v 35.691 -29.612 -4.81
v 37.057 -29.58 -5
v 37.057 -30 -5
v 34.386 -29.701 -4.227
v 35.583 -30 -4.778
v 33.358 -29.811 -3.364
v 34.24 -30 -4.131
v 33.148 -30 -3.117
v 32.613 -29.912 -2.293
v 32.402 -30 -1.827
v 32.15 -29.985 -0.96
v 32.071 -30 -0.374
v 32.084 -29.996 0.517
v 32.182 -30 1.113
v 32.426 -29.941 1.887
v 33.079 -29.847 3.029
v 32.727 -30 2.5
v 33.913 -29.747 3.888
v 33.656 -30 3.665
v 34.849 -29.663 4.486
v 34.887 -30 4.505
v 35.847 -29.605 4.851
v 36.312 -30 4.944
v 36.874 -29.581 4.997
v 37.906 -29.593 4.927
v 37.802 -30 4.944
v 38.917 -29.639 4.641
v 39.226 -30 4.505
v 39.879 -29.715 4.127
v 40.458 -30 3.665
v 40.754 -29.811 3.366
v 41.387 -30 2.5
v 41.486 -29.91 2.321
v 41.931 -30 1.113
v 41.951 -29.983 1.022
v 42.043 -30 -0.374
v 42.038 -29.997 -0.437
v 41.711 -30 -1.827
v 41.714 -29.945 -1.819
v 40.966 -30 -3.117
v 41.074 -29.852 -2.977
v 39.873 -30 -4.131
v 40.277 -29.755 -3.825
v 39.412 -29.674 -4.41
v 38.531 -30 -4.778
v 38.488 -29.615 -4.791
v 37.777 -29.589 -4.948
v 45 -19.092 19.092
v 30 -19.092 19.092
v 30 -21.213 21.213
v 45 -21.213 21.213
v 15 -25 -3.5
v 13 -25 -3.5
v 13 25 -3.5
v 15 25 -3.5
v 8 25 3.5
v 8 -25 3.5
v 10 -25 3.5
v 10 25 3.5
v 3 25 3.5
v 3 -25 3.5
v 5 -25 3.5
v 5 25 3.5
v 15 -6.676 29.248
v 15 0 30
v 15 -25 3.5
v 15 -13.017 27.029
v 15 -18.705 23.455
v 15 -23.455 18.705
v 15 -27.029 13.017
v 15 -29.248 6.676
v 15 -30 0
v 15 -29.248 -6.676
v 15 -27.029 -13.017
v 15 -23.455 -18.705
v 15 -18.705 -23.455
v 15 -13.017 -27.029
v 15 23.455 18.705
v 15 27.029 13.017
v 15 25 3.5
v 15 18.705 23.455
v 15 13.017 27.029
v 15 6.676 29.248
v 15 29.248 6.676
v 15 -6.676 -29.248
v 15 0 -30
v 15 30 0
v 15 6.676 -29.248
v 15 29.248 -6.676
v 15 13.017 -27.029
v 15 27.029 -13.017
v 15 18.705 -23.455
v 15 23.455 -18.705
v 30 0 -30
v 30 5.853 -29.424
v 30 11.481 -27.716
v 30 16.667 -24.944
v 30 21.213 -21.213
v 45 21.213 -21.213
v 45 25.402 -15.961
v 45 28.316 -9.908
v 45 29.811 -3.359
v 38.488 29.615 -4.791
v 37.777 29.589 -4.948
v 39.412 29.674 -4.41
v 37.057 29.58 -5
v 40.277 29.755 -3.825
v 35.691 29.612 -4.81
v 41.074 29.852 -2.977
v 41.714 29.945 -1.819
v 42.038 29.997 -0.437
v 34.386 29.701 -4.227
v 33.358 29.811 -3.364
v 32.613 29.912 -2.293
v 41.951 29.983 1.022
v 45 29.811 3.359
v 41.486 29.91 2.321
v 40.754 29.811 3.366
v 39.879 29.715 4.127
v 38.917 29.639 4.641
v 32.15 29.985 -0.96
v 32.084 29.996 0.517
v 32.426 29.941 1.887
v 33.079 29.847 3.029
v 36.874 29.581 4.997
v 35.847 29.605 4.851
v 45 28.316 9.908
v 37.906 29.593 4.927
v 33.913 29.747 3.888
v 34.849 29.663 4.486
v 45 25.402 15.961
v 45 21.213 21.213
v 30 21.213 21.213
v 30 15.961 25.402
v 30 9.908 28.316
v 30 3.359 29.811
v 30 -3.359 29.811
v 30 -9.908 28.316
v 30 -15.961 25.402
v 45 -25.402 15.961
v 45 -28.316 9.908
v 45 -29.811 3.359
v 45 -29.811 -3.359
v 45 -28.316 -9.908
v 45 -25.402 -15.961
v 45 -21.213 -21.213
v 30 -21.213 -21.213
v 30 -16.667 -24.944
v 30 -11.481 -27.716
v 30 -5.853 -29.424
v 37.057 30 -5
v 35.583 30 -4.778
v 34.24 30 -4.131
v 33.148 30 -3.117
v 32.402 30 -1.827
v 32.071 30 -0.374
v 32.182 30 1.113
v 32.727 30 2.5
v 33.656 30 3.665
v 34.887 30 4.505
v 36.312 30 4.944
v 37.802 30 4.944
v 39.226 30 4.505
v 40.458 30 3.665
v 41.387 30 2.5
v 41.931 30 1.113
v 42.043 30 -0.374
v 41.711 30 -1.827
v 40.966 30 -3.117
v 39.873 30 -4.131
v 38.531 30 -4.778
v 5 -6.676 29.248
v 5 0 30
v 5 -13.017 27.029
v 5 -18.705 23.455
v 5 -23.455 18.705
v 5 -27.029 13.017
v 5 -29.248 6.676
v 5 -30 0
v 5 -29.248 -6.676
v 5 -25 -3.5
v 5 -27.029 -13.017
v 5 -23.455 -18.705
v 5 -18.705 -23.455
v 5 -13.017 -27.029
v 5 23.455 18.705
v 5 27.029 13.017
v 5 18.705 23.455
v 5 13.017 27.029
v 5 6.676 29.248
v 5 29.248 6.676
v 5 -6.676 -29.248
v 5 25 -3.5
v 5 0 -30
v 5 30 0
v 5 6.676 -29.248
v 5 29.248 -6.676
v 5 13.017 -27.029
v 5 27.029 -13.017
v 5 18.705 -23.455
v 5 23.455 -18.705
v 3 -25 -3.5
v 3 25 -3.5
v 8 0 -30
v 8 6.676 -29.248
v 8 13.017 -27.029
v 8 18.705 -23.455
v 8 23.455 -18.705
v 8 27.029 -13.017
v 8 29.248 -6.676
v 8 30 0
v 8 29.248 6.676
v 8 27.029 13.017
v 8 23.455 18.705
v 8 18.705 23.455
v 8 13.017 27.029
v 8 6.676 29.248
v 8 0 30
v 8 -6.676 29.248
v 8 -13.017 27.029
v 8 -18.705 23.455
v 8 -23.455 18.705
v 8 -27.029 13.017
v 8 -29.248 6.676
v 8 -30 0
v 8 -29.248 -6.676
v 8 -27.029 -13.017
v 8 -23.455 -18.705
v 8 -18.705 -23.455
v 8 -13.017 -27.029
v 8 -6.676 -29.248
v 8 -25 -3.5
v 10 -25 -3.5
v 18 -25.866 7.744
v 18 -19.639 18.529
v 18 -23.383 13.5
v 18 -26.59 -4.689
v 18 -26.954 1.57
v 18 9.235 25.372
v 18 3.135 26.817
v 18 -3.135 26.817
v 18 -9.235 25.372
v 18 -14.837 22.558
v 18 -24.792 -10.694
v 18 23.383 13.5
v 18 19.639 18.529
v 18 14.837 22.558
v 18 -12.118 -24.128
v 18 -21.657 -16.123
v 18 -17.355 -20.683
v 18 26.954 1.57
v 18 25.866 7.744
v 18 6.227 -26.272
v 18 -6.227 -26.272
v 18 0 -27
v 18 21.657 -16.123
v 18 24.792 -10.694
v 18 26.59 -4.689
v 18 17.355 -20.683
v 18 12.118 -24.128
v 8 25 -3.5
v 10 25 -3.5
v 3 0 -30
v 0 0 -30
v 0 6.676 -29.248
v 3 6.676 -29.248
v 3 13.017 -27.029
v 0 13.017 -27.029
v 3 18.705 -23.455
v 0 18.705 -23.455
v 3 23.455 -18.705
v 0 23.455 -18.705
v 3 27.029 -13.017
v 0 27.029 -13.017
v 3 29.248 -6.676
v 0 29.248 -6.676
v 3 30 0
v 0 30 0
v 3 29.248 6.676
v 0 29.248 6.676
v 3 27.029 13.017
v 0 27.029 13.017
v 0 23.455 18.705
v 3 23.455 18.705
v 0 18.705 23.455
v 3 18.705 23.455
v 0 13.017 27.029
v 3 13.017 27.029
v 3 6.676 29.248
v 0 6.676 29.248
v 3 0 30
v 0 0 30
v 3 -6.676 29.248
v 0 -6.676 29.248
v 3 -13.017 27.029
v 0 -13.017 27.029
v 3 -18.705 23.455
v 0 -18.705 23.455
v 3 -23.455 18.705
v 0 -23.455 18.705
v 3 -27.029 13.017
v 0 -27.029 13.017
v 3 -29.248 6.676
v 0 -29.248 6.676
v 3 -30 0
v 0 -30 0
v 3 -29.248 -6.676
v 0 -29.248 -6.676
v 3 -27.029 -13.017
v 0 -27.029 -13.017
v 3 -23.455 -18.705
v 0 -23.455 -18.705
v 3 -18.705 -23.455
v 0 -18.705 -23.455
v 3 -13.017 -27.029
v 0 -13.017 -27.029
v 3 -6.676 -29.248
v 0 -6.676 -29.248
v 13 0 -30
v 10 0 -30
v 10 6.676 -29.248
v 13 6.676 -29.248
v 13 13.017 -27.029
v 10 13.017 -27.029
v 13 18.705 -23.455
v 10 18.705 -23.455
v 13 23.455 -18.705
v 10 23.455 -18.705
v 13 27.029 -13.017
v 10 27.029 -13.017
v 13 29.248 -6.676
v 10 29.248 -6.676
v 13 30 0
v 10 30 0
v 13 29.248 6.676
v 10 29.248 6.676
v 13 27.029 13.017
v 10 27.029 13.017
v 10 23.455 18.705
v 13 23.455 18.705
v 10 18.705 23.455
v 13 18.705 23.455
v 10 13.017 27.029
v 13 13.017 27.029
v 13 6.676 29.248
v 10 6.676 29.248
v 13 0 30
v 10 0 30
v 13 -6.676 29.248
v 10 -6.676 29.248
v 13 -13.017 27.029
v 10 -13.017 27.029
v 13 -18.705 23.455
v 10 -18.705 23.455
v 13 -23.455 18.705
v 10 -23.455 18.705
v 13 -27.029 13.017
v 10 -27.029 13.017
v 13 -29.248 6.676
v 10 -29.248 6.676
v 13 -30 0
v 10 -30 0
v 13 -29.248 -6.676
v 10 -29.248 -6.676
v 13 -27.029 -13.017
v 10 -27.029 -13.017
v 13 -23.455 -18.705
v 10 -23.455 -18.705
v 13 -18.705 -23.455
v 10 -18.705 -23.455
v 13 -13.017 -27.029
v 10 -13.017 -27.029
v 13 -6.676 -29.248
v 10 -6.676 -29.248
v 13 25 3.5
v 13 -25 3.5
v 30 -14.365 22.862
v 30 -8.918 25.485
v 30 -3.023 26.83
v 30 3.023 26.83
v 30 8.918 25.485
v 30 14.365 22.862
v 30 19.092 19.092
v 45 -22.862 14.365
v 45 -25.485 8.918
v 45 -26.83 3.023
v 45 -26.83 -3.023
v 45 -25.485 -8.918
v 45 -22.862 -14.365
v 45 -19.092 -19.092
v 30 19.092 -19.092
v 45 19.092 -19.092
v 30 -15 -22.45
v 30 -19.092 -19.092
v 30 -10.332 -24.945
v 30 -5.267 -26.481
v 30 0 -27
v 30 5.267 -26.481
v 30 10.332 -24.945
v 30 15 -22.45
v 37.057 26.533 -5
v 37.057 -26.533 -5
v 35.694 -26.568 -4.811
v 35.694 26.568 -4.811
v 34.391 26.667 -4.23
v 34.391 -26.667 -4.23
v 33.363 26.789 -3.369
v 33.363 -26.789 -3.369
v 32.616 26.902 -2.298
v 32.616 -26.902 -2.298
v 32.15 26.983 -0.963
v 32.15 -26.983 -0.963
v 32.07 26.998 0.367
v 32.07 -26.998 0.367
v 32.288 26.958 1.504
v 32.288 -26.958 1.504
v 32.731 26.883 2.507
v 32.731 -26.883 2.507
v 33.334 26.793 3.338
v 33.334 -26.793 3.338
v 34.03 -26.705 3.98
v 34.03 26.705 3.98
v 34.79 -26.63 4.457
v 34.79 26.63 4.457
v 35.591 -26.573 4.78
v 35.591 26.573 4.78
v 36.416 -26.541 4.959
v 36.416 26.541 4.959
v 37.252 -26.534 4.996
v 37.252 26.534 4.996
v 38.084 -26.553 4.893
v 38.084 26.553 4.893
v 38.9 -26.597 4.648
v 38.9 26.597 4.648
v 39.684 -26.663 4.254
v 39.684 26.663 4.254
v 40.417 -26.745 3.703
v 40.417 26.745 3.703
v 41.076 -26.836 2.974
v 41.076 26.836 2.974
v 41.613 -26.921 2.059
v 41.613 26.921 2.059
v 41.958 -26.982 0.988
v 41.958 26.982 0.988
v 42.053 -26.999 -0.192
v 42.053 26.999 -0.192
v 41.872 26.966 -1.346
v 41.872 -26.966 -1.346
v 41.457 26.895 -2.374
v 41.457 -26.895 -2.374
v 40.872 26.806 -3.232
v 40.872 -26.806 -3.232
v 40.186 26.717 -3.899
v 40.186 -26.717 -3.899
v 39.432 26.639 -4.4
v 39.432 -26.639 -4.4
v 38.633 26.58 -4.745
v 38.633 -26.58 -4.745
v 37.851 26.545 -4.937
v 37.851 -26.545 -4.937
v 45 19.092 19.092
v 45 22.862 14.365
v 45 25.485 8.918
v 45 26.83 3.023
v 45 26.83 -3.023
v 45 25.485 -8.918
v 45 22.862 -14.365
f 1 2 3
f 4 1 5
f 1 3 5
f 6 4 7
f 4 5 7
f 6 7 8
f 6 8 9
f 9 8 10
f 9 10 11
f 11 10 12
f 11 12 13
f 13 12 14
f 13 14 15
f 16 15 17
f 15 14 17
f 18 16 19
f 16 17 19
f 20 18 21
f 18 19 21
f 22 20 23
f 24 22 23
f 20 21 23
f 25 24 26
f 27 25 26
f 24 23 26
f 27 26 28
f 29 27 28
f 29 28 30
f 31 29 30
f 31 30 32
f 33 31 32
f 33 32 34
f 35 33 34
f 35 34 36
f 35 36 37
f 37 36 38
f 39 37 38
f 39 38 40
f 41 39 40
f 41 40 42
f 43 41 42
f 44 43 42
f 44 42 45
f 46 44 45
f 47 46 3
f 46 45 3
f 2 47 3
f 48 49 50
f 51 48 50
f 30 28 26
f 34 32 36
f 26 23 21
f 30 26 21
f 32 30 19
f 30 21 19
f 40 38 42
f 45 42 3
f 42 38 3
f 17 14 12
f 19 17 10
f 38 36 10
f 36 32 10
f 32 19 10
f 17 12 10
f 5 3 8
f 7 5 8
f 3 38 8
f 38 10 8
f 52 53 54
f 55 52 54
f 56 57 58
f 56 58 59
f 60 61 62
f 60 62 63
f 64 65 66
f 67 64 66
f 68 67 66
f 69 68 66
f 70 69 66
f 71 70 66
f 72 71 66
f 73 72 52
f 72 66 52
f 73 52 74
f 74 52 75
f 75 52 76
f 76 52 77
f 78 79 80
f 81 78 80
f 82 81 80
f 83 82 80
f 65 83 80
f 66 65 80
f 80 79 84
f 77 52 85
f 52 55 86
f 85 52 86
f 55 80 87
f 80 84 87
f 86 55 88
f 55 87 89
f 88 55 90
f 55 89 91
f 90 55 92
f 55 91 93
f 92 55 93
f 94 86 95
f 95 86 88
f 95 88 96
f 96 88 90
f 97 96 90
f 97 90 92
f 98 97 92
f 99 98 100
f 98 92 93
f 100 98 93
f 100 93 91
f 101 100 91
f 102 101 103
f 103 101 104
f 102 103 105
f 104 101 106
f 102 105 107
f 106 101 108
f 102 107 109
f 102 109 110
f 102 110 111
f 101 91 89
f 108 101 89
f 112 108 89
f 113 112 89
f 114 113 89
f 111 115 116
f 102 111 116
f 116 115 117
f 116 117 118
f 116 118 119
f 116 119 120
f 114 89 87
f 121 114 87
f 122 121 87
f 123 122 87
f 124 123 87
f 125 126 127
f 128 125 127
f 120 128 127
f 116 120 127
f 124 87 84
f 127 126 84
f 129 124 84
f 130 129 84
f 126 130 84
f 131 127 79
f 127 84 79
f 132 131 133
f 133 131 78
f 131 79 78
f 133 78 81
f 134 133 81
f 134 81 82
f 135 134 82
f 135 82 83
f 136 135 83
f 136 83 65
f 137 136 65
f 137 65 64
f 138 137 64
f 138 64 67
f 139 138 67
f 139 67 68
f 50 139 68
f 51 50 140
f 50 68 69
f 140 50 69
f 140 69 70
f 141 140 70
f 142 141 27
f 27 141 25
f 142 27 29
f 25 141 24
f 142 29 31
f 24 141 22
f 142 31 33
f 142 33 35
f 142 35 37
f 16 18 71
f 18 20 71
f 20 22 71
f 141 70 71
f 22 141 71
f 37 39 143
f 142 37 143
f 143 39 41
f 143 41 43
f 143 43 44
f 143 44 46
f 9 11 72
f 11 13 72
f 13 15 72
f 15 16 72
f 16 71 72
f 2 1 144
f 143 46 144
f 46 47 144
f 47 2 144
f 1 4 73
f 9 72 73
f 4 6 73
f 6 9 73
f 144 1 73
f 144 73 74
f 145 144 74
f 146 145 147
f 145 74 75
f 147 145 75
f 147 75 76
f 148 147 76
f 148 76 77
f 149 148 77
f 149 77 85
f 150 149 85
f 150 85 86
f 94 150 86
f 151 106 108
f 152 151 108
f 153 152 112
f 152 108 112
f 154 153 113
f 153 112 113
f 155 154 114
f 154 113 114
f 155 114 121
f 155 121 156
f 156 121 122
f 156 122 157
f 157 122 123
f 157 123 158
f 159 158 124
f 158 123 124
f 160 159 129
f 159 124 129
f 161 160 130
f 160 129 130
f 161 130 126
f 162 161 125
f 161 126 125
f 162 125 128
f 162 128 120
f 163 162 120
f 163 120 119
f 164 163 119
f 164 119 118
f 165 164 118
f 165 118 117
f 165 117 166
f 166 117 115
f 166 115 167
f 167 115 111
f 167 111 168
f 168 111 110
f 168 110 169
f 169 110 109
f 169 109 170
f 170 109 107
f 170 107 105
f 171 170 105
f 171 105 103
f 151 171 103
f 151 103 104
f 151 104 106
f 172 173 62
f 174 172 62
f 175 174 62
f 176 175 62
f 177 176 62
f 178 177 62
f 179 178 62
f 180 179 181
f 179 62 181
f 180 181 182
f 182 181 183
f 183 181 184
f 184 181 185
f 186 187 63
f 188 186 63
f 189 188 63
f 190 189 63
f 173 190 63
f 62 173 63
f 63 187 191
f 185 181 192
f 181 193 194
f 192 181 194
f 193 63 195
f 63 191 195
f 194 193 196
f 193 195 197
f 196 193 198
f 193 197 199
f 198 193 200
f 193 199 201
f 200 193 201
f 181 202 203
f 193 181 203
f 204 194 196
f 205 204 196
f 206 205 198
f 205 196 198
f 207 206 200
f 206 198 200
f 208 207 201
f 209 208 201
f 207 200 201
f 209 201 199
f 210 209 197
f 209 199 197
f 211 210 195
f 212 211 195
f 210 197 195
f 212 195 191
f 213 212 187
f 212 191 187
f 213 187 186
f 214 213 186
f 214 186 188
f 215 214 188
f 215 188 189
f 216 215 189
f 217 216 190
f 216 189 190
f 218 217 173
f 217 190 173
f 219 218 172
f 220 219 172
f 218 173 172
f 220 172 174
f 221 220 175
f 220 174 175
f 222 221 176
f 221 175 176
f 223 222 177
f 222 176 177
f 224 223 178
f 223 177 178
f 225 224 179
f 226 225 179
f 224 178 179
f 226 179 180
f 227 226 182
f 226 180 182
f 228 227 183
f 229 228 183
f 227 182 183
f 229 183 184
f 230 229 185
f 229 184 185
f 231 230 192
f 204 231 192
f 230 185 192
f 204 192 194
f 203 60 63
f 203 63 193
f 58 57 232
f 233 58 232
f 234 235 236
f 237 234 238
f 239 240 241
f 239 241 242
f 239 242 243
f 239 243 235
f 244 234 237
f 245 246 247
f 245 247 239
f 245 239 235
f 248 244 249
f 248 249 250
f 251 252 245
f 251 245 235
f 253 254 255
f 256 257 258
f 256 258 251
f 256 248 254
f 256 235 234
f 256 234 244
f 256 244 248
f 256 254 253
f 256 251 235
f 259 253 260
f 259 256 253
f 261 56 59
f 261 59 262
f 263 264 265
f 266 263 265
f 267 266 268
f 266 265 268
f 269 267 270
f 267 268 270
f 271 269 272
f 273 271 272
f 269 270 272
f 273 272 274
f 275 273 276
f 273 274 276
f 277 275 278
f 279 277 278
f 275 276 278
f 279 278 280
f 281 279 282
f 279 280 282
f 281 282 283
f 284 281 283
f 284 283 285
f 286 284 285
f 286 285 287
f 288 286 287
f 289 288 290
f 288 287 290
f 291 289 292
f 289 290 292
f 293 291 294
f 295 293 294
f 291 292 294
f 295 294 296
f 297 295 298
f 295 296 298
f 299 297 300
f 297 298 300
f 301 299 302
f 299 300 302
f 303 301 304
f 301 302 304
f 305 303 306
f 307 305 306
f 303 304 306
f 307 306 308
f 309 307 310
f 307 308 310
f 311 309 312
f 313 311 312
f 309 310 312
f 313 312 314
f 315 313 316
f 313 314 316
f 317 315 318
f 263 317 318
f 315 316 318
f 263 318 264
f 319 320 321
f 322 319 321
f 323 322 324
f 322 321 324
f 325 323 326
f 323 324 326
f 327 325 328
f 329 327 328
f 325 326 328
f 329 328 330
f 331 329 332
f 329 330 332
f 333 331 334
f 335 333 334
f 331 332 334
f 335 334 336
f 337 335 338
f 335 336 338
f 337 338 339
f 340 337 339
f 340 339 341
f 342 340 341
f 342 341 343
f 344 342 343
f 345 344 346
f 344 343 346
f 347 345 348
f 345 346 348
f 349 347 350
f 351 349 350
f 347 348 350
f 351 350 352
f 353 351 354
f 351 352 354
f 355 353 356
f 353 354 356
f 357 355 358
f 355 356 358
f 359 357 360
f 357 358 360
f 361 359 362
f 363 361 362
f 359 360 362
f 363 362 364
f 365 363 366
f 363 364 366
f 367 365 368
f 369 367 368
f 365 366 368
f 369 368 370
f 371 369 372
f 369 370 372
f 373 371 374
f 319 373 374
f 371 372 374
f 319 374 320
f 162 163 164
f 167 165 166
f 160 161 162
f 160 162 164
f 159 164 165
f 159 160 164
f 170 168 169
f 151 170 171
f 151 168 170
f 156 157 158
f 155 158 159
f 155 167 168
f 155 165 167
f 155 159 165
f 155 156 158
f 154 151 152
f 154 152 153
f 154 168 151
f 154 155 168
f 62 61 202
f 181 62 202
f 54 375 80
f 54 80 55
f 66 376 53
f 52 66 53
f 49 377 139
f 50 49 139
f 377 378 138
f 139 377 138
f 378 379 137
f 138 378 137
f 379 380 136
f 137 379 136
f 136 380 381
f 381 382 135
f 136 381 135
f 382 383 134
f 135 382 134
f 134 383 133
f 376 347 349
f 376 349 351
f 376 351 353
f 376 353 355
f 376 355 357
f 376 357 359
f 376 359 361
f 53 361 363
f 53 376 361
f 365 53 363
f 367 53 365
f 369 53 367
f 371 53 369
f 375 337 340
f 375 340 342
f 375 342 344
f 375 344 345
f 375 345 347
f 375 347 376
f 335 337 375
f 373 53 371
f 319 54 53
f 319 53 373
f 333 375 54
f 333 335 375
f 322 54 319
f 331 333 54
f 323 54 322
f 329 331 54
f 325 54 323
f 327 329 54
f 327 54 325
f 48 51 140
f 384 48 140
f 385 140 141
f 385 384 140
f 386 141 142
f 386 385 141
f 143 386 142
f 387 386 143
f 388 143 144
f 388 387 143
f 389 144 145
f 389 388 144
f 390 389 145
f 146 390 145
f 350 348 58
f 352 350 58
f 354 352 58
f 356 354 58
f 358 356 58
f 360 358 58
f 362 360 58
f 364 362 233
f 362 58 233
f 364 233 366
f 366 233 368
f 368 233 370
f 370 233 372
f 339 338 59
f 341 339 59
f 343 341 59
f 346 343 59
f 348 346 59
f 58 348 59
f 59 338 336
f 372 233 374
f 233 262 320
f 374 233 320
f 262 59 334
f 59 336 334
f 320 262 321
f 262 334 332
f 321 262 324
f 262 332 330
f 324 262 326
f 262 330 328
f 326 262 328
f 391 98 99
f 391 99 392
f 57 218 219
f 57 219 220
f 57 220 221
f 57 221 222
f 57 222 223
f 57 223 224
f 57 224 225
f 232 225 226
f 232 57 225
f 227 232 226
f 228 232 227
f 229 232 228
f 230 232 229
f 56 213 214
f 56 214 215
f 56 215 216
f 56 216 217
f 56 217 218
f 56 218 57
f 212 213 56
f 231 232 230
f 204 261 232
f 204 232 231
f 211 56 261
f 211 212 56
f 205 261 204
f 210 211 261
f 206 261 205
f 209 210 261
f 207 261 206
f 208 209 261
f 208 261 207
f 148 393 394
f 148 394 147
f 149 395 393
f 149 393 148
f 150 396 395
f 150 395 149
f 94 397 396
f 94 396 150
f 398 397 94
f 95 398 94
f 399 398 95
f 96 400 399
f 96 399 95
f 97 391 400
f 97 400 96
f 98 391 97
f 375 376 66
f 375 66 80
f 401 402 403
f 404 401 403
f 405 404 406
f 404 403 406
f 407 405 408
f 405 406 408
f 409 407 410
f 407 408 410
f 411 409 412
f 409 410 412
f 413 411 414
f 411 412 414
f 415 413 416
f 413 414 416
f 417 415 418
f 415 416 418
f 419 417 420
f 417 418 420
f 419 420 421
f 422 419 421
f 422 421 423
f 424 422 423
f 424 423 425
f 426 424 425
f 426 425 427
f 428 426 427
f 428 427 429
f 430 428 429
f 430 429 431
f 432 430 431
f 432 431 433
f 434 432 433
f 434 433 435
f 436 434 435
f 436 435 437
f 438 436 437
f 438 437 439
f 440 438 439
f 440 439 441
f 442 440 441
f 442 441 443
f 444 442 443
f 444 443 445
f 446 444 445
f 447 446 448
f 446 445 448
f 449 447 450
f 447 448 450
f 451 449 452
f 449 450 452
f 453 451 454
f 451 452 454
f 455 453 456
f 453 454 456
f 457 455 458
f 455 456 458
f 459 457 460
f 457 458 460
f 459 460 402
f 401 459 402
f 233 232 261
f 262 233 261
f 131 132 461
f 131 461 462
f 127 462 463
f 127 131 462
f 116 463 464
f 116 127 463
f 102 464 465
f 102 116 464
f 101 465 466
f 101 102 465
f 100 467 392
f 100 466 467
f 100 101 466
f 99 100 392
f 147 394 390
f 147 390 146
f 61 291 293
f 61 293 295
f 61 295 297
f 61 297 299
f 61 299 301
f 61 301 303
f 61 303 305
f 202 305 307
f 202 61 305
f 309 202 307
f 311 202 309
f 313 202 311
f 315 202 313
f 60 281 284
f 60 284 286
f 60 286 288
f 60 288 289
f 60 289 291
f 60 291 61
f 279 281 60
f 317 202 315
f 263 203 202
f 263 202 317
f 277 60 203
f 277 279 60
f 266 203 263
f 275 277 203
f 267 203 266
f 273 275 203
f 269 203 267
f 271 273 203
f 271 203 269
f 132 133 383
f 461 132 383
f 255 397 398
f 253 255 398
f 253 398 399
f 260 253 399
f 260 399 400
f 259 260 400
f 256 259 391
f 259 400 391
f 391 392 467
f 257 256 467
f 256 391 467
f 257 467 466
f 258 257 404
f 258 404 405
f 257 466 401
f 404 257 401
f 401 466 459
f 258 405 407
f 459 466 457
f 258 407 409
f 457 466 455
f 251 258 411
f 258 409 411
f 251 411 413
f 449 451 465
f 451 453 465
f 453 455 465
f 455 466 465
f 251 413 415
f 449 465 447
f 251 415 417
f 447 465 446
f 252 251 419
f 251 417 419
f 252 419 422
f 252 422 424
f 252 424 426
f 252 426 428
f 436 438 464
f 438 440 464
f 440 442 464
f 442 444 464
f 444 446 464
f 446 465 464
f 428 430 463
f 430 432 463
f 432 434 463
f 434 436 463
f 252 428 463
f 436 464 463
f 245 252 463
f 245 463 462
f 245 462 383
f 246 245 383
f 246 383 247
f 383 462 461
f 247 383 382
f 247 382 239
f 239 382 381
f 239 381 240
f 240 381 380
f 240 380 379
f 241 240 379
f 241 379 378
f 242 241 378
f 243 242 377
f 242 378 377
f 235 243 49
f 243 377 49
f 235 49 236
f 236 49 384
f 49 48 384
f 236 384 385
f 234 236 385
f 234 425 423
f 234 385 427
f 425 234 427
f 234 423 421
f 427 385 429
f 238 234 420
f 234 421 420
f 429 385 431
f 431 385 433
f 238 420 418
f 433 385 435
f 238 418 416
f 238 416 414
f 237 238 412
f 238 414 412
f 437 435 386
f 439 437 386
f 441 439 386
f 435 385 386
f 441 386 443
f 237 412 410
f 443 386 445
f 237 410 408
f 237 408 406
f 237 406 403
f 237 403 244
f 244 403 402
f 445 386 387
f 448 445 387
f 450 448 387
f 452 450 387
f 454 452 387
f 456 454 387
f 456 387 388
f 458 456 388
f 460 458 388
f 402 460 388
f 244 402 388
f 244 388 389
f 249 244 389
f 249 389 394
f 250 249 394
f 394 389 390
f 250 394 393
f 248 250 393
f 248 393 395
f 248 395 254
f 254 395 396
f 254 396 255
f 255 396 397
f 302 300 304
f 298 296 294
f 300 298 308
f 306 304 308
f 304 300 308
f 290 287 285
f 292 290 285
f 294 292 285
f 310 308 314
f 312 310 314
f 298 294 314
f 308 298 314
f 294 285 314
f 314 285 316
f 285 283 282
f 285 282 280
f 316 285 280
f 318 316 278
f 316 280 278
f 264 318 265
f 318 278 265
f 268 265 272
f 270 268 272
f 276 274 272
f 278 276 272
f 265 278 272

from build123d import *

# Parameters (mm, degrees)
SKETCH1_R            = 30
BOSS_EXTRUDE1_DEPTH  = 3
SKETCH2_W            = 7
SKETCH2_H            = 50
BOSS_EXTRUDE2_DEPTH  = 2
SKETCH3_R            = 30
BOSS_EXTRUDE3_DEPTH  = 3
SKETCH4_W            = 7
SKETCH4_H            = 50
BOSS_EXTRUDE4_DEPTH  = 2
SKETCH5_R            = 30
BOSS_EXTRUDE5_DEPTH  = 3
SKETCH6_W            = 7
SKETCH6_H            = 50
BOSS_EXTRUDE6_DEPTH  = 2
SKETCH7_R            = 30
BOSS_EXTRUDE7_DEPTH  = 30
SKETCH8_R            = 27
CUT_EXTRUDE3_DEPTH   = 27
CUT_EXTRUDE6_START   = -15
CUT_EXTRUDE6_DEPTH   = 15
BOSS_EXTRUDE11_START = -30.000001
SKETCH14_R           = 5
BOSS_EXTRUDE11_DEPTH = 60.000002


with BuildPart() as part:
    # Sketch1 → Boss-Extrude1 (new body)
    with BuildSketch(Plane(origin=(0, 0, 0), x_dir=(0, 0, -1), z_dir=(1, 0, 0))):
        Circle(SKETCH1_R)
    extrude(amount=BOSS_EXTRUDE1_DEPTH)

    # Sketch2 → Boss-Extrude2 (add)
    with BuildSketch(Plane(origin=(3, 0, 0), x_dir=(0, 0, -1), z_dir=(1, 0, 0))):
        Rectangle(SKETCH2_W, SKETCH2_H)
    extrude(amount=BOSS_EXTRUDE2_DEPTH)

    # Sketch3 → Boss-Extrude3 (add)
    with BuildSketch(Plane(origin=(5, 0, 0), x_dir=(0, 0, -1), z_dir=(1, 0, 0))):
        Circle(SKETCH3_R)
    extrude(amount=BOSS_EXTRUDE3_DEPTH)

    # Sketch4 → Boss-Extrude4 (add)
    with BuildSketch(Plane(origin=(8, 0, 0), x_dir=(0, 0, -1), z_dir=(1, 0, 0))):
        Rectangle(SKETCH4_W, SKETCH4_H)
    extrude(amount=BOSS_EXTRUDE4_DEPTH)

    # Sketch5 → Boss-Extrude5 (add)
    with BuildSketch(Plane(origin=(10, 0, 0), x_dir=(0, 0, -1), z_dir=(1, 0, 0))):
        Circle(SKETCH5_R)
    extrude(amount=BOSS_EXTRUDE5_DEPTH)

    # Sketch6 → Boss-Extrude6 (add)
    with BuildSketch(Plane(origin=(13, 0, 0), x_dir=(0, 0, -1), z_dir=(1, 0, 0))):
        Rectangle(SKETCH6_W, SKETCH6_H)
    extrude(amount=BOSS_EXTRUDE6_DEPTH)

    # Sketch7 → Boss-Extrude7 (add)
    with BuildSketch(Plane(origin=(15, 0, 0), x_dir=(0, 0, -1), z_dir=(1, 0, 0))):
        Circle(SKETCH7_R)
    extrude(amount=BOSS_EXTRUDE7_DEPTH)

    # Sketch8 → Cut-Extrude3 (cut)
    with BuildSketch(Plane(origin=(45, 0, 0), x_dir=(0, 0, -1), z_dir=(1, 0, 0))):
        Circle(SKETCH8_R)
    extrude(amount=-CUT_EXTRUDE3_DEPTH, mode=Mode.SUBTRACT)

    # Sketch9 → Cut-Extrude6 (cut)
    with BuildSketch(Plane(origin=(45, 0, 0), x_dir=(0, 0, -1), z_dir=(1, 0, 0)).offset(CUT_EXTRUDE6_START)):
        with BuildLine():
            Line((21.213203436, 21.213203436), (19.091883092, 19.091883092))
            ThreePointArc((19.091883092, 19.091883092), (27, 0), (19.091883092, -19.091883092))
            Line((19.091883092, -19.091883092), (21.213203436, -21.213203436))
            ThreePointArc((21.213203436, -21.213203436), (30, 0), (21.213203436, 21.213203436))
        make_face()
        with BuildLine():
            Line((-21.213203436, 21.213203436), (-19.091883092, 19.091883092))
            ThreePointArc((-19.091883092, 19.091883092), (-27, 0), (-19.091883092, -19.091883092))
            Line((-19.091883092, -19.091883092), (-21.213203436, -21.213203436))
            ThreePointArc((-21.213203436, -21.213203436), (-30, 0), (-21.213203436, 21.213203436))
        make_face()
    extrude(amount=CUT_EXTRUDE6_DEPTH, mode=Mode.SUBTRACT)

    # Sketch14 → Boss-Extrude11 (add)
    with BuildSketch(Plane(origin=(0, 0, 0), x_dir=(1, 0, 0), z_dir=(0, 1, 0)).offset(BOSS_EXTRUDE11_START)):
        with Locations(Location((37.056780036, 0, 0), (0, 0, 90))):
            Circle(SKETCH14_R)
    extrude(amount=BOSS_EXTRUDE11_DEPTH)


solid = part.part
